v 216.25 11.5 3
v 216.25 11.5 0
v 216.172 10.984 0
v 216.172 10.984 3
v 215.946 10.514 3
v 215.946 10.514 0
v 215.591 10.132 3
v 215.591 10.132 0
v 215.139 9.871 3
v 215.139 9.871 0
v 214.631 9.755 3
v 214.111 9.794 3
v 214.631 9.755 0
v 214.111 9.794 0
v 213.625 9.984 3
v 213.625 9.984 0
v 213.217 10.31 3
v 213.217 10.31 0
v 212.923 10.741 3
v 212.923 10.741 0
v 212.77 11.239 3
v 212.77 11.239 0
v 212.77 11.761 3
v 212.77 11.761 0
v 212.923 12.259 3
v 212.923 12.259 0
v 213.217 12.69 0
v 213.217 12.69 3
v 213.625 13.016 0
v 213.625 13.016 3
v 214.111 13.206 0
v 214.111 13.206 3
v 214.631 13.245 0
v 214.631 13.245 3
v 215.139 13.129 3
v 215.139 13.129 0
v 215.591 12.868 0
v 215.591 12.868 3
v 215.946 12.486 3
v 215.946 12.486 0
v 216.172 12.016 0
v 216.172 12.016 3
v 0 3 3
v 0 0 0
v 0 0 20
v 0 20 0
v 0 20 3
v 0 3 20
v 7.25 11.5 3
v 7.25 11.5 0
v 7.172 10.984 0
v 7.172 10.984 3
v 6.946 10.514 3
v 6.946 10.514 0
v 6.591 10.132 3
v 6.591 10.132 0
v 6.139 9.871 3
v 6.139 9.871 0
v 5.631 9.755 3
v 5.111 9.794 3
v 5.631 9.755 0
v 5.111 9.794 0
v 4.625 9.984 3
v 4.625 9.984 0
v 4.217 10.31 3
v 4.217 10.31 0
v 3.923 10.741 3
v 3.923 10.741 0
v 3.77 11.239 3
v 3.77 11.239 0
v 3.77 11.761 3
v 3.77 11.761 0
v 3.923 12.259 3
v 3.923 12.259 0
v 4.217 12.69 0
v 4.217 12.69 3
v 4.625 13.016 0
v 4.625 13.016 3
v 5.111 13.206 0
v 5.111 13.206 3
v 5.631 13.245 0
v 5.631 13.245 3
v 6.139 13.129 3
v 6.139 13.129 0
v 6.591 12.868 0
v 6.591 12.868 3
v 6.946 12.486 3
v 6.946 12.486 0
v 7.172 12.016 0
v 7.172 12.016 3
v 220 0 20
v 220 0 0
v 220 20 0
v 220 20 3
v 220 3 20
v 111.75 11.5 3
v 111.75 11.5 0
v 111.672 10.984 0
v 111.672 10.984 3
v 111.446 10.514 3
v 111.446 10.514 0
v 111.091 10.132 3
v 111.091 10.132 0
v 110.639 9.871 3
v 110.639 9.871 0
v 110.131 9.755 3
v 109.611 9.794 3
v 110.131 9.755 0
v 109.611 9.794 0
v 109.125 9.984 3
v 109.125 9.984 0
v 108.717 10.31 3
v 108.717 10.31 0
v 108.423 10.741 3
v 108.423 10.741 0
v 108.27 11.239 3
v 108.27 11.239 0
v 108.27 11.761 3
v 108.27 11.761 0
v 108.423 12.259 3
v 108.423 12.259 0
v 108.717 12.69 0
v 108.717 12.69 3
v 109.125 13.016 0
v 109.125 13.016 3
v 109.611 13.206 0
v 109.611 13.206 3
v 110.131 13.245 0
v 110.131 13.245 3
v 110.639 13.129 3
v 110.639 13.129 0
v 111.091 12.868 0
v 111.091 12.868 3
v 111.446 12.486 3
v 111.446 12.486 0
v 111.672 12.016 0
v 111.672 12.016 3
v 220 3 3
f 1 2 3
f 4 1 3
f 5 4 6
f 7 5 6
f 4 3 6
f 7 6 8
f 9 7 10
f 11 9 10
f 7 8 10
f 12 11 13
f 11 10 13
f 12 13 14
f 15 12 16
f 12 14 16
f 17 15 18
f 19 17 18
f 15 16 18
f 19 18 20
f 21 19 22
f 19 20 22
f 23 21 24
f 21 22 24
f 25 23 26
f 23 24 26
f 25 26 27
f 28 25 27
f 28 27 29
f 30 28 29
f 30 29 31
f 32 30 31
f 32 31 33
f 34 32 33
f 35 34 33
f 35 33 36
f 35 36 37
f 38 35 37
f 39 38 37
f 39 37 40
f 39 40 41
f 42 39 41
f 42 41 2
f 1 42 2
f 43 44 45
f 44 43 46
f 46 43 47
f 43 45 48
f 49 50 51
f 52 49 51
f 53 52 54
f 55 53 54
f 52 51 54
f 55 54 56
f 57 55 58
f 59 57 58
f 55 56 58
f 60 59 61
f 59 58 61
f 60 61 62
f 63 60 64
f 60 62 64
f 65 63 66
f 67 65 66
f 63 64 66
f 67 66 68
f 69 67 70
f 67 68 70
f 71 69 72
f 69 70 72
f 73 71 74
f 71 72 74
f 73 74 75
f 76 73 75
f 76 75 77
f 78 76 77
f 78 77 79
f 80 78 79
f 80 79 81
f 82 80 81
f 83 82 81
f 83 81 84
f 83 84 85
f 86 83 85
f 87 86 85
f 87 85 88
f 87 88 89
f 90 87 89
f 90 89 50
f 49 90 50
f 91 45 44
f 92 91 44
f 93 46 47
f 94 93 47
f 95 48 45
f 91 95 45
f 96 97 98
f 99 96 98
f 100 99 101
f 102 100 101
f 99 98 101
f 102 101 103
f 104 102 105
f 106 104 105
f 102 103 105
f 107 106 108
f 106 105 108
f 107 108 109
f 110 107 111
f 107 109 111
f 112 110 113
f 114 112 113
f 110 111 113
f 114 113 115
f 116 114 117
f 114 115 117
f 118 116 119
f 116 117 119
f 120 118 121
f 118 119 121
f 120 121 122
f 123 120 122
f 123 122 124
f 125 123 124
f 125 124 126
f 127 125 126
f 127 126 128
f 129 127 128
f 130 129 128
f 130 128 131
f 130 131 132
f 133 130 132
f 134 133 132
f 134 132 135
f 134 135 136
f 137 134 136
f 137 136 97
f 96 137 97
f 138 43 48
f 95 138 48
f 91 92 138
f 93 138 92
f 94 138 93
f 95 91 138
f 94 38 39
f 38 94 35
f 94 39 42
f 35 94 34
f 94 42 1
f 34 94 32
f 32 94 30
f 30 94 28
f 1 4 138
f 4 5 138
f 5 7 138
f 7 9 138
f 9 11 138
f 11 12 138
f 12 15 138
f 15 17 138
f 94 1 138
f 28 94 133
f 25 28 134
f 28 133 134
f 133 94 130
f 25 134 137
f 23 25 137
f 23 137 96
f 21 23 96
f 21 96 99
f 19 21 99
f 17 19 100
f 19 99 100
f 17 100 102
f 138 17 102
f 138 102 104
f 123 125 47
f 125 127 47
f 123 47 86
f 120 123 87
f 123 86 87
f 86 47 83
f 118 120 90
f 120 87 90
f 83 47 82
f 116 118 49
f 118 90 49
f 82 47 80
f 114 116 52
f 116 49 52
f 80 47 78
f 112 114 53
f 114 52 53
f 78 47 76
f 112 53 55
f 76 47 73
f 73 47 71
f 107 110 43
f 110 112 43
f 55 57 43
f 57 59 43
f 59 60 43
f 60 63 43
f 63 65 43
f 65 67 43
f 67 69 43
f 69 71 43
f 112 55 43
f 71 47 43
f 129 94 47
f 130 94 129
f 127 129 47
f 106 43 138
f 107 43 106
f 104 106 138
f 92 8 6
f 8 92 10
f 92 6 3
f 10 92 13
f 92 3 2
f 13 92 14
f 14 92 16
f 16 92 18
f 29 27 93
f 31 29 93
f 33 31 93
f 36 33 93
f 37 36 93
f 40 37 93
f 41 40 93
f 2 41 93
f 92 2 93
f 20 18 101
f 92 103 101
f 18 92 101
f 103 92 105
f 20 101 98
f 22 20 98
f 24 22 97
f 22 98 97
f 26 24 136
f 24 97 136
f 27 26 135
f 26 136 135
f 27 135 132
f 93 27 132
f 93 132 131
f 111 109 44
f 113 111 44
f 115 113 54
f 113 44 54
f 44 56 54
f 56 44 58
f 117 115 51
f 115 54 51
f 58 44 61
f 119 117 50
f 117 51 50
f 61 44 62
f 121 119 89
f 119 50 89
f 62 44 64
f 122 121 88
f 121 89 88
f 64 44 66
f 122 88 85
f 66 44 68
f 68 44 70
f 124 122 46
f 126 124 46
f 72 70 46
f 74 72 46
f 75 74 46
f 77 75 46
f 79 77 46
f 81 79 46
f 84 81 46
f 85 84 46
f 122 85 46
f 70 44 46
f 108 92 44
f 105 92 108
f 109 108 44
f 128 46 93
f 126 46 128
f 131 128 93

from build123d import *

# Parameters (mm, degrees)
F1_DEPTH = 220
F2_R     = 1.75
F3_DEPTH = 25


with BuildPart() as f1:
    # F0 (on Right) → F1 (new body)
    with BuildSketch(Plane.YZ):
        Polygon((0, 20), (0, 0), (20, 0), (20, 3), (3, 3), (3, 20), align=None)
    extrude(amount=F1_DEPTH)

    # F2 (on face) → F3 (cut)
    with BuildSketch(Plane(origin=(0, 0, 0), x_dir=(1, 0, 0), z_dir=(0, 0, -1))):
        with Locations((5.5, -11.5)):
            Circle(F2_R)
        with Locations((110, -11.5)):
            Circle(F2_R)
        with Locations((214.5, -11.5)):
            Circle(F2_R)
    extrude(amount=-F3_DEPTH, mode=Mode.SUBTRACT)


solid = f1.part
